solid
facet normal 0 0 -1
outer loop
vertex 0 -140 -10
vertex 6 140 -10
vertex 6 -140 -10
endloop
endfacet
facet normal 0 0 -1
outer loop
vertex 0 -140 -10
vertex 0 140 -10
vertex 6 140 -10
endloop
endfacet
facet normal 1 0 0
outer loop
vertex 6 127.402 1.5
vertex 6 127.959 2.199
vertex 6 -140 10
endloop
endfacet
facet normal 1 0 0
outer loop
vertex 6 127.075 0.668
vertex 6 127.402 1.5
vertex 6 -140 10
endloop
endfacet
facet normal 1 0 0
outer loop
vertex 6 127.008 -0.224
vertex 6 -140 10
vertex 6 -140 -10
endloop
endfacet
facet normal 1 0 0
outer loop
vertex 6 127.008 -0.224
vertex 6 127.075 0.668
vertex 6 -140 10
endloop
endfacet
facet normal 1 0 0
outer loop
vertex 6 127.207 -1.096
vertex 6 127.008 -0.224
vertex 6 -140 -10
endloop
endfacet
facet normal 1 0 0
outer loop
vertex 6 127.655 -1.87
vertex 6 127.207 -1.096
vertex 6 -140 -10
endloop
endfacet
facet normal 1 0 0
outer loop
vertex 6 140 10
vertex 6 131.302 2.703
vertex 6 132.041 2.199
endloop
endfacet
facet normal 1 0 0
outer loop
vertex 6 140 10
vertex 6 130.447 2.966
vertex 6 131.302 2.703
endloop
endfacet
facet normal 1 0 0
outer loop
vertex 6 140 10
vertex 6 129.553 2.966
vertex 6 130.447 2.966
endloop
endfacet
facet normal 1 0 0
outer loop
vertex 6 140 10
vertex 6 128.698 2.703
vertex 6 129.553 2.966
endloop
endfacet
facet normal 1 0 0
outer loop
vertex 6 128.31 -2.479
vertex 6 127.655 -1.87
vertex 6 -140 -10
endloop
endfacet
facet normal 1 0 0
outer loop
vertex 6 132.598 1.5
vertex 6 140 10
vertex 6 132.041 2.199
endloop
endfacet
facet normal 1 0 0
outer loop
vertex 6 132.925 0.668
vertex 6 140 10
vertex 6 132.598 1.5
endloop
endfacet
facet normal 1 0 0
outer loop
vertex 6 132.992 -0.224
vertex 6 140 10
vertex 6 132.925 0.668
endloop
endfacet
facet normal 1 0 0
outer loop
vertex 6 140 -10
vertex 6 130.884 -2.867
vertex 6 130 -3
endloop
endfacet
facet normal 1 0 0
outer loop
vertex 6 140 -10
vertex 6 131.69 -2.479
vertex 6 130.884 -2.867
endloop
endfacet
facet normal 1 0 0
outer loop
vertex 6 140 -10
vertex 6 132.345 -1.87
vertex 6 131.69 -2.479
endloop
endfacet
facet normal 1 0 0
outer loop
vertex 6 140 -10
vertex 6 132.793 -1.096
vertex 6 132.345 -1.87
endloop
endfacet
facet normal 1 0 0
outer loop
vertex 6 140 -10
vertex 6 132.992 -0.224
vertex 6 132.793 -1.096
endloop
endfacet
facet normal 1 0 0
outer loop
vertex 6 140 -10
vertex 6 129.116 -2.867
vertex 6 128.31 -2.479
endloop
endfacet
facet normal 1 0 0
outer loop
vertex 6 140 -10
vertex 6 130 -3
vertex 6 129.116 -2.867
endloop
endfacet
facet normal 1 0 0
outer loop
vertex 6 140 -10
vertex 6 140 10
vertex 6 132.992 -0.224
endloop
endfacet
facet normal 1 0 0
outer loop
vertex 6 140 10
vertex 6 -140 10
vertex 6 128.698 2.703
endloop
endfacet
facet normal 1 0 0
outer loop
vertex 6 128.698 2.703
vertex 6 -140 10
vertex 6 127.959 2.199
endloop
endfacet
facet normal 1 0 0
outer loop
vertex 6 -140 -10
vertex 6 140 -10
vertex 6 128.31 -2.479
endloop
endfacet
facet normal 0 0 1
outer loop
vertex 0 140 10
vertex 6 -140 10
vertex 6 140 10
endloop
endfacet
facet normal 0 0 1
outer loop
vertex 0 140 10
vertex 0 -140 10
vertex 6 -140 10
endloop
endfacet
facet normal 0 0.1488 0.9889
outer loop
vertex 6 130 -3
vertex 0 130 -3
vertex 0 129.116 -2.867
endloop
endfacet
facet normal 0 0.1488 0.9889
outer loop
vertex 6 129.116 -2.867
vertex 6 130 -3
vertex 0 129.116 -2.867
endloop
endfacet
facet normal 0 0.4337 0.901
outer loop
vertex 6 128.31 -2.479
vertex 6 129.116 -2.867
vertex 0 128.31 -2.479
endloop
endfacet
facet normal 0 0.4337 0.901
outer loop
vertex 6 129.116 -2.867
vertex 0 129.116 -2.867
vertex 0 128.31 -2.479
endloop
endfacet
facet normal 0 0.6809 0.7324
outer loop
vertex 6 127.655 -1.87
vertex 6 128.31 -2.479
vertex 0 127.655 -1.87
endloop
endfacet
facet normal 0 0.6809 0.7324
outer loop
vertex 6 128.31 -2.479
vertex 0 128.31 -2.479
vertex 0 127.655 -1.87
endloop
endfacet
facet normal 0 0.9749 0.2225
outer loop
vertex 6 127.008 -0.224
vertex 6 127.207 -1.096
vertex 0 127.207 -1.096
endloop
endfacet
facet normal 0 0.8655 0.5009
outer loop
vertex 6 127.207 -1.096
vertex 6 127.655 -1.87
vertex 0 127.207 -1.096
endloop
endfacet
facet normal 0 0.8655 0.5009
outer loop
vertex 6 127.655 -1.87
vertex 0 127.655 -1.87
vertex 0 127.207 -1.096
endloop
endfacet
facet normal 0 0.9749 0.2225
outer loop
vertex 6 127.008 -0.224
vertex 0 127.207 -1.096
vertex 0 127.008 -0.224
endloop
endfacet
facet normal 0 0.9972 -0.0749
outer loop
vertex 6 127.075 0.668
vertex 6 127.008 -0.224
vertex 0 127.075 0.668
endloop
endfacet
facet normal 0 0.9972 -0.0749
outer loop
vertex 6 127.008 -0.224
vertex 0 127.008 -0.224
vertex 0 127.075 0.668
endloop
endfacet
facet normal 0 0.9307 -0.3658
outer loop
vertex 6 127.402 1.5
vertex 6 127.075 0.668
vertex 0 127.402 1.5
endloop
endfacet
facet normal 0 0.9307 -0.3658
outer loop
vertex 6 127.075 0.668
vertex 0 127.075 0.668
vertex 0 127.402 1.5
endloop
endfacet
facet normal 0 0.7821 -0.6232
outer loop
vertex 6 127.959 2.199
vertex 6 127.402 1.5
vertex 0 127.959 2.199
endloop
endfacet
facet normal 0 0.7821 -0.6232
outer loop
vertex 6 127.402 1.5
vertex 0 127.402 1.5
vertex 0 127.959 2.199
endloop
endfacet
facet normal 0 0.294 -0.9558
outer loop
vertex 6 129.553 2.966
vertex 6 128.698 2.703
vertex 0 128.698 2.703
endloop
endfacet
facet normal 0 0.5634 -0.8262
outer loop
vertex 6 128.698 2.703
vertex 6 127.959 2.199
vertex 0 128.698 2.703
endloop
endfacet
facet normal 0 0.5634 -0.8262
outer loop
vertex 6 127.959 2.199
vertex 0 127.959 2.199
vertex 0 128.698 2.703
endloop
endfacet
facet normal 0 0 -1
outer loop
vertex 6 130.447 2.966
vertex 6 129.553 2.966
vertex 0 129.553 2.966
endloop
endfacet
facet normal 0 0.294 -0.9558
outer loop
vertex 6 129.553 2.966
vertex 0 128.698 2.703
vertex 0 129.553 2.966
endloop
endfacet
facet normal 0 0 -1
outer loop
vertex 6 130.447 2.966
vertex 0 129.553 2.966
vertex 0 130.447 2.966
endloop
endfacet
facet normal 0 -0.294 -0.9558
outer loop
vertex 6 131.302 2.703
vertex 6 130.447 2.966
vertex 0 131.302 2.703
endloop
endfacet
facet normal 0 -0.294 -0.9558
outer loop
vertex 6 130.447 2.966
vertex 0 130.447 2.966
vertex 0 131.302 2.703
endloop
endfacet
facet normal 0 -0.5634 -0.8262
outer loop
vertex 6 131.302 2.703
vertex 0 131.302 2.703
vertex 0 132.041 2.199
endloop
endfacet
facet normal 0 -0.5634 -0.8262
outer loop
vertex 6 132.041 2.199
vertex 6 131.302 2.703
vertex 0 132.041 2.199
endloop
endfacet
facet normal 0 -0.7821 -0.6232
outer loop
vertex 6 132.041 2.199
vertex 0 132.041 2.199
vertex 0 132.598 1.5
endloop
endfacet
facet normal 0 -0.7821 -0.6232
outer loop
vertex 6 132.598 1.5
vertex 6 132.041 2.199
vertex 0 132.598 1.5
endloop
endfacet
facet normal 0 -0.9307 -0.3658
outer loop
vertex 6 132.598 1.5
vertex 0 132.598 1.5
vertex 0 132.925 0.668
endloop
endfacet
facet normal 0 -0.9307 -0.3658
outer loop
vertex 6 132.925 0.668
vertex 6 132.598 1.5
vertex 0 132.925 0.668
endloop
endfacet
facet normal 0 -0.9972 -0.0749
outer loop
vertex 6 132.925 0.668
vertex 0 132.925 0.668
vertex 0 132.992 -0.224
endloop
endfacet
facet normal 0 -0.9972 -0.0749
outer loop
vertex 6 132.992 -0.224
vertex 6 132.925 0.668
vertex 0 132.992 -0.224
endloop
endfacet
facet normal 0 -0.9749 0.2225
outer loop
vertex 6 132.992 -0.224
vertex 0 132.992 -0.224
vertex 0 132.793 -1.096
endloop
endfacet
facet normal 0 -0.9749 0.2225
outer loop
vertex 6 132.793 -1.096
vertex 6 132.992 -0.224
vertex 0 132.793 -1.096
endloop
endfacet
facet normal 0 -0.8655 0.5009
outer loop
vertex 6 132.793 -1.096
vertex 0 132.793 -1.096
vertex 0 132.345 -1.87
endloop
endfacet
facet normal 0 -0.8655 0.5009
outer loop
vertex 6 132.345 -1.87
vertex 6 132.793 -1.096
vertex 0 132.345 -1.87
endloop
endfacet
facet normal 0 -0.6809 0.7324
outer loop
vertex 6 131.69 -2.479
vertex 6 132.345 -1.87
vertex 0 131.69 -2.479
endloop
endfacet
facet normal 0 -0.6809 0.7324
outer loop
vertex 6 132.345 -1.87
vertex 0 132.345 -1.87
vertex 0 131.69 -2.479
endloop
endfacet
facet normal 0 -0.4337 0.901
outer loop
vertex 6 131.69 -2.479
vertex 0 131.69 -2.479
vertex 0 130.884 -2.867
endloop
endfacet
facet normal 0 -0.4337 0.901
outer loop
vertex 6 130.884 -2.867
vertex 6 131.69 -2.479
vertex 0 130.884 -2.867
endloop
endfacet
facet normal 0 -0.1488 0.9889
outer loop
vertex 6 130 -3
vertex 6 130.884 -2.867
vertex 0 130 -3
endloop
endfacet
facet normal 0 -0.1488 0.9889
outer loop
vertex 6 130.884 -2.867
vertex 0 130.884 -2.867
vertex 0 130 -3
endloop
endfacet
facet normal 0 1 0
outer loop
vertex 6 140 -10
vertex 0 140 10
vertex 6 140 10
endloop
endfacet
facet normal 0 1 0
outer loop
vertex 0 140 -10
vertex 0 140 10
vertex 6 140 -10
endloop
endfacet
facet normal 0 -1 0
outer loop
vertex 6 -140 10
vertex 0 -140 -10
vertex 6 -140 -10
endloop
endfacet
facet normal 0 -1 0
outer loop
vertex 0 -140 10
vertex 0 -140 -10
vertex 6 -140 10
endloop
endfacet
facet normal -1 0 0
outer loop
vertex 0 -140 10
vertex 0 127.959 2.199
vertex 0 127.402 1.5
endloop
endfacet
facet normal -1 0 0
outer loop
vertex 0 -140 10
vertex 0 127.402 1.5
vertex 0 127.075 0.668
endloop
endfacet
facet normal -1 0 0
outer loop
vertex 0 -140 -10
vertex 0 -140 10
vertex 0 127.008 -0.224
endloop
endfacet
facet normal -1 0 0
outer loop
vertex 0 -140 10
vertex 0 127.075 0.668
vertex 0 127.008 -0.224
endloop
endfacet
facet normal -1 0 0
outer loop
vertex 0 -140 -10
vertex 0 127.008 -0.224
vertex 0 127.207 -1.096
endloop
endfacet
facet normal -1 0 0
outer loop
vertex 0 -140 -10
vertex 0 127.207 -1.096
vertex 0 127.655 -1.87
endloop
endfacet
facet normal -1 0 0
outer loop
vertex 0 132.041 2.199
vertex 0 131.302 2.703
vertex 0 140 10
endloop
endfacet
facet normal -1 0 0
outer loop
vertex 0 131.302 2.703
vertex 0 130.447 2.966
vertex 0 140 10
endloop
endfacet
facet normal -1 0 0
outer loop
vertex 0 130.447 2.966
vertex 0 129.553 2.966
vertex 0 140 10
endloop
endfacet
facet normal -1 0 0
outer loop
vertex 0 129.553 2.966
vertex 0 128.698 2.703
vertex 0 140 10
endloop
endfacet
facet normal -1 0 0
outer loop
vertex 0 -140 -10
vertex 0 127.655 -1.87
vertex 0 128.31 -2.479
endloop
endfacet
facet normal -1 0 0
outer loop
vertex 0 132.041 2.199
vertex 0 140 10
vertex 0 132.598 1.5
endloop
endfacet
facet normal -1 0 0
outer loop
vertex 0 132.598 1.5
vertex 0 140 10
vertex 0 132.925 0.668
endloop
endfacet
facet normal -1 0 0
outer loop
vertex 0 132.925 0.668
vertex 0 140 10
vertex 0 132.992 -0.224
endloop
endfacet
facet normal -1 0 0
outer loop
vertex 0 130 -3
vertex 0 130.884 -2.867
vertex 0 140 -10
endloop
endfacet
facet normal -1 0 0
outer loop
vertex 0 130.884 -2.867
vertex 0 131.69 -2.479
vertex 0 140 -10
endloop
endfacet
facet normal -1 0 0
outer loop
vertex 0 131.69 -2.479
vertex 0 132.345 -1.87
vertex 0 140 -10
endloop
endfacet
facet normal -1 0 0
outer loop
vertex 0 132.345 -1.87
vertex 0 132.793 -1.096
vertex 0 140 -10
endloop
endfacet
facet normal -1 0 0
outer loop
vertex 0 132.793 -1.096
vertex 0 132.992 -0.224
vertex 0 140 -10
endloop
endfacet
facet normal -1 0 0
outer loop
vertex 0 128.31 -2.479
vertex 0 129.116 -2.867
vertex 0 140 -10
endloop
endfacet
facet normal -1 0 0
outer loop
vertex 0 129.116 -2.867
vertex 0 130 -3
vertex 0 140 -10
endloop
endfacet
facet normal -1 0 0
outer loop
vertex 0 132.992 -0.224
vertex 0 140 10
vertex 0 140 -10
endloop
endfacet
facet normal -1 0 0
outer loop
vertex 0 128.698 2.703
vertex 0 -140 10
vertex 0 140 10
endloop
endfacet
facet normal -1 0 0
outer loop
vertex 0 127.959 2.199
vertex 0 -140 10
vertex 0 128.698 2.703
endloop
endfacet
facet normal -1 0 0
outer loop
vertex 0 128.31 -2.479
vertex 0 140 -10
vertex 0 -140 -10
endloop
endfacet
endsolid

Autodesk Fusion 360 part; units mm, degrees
sketch "Sketch1" plane through (0, 0, 0) normal (1, 0, 0) x (0, 0, -1)
  line L0 (-10, 140) -> (10, 140)
  line L1 (10, 140) -> (10, -140)
  line L2 (10, -140) -> (-10, -140)
  line L3 (-10, -140) -> (-10, 140)
  circle A0 centre (0, 130) radius 3
  dimension "d1" = 20
  dimension "d2" = 280
  dimension "d3" = 6
  dimension "d4" = 10
extrude "Extrude1" add sketch "Sketch1" along normal blind 6
